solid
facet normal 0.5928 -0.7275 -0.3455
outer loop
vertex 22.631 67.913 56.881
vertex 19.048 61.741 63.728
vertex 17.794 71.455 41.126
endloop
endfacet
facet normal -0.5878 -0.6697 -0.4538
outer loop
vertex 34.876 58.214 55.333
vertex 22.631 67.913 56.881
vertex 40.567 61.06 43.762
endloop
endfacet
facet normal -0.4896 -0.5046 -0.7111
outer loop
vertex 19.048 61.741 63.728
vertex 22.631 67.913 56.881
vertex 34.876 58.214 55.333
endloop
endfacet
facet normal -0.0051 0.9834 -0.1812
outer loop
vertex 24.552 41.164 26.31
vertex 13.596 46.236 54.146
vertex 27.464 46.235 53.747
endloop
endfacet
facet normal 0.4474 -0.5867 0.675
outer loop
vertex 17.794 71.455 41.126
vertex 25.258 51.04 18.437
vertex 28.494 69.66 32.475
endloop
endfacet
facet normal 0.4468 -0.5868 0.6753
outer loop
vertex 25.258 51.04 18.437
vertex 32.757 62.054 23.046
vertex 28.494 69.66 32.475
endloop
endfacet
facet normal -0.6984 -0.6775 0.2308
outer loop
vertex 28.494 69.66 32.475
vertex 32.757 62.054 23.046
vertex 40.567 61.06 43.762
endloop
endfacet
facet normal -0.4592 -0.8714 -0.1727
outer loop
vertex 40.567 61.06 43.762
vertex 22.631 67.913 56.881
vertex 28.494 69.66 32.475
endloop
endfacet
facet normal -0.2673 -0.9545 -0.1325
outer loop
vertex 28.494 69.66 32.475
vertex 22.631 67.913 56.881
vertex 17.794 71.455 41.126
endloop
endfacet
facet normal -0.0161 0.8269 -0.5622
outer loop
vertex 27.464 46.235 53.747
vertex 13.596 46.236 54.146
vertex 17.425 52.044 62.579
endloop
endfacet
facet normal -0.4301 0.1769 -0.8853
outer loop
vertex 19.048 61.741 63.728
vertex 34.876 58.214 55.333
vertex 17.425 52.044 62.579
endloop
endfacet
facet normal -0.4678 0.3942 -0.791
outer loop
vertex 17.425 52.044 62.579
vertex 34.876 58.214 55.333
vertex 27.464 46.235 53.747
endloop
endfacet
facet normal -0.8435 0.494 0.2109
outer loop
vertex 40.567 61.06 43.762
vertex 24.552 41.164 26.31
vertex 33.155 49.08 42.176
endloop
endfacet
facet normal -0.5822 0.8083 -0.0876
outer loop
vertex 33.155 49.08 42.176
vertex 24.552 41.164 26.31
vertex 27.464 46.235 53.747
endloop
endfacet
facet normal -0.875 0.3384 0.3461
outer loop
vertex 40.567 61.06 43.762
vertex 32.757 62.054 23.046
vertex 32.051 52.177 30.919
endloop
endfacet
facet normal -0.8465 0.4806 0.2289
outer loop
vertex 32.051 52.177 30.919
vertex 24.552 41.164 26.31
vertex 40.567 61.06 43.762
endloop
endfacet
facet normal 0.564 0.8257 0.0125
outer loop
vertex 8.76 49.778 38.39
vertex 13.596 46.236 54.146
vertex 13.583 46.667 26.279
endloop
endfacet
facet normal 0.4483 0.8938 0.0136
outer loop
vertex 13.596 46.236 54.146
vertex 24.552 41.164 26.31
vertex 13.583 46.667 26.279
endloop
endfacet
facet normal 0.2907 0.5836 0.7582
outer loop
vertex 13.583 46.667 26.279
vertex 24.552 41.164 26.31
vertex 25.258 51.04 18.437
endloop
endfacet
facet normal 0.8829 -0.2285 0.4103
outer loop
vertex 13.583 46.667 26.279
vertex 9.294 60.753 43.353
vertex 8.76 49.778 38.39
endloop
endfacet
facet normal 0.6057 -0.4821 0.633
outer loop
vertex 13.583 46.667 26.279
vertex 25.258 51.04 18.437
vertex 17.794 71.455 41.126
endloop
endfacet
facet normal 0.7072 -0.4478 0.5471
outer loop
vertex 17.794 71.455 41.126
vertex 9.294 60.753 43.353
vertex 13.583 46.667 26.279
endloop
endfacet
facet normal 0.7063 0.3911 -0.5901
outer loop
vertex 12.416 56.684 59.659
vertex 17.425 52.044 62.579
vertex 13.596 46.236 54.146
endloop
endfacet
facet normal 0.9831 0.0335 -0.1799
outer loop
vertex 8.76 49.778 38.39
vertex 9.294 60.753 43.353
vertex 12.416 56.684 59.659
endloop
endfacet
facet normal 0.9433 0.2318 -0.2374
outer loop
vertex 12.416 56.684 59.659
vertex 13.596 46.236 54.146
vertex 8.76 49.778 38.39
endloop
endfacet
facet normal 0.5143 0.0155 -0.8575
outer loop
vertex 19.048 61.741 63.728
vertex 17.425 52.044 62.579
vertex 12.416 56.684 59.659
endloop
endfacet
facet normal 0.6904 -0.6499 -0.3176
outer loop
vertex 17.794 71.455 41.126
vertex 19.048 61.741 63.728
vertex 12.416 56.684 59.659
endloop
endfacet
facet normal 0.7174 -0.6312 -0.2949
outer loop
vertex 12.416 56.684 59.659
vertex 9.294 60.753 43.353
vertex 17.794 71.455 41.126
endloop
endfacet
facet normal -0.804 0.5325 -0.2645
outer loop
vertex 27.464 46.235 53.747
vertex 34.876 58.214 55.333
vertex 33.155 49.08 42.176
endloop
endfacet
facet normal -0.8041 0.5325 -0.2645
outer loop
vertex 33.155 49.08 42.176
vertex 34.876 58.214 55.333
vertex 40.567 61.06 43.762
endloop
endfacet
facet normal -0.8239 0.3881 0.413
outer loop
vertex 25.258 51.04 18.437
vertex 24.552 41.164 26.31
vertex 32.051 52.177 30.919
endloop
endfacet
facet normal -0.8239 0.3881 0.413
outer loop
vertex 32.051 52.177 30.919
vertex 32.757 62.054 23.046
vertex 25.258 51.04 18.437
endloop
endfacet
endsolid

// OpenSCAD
// Auto-generated auxetic polyhedron
points = [
    [17.794124, 71.455293, 41.125710],
    [19.047628, 61.741216, 63.728135],
    [22.630669, 67.913069, 56.881282],
    [40.566748, 61.059511, 43.761973],
    [34.876189, 58.214168, 55.332800],
    [27.464187, 46.234568, 53.746520],
    [13.596412, 46.236146, 54.146020],
    [24.552296, 41.163828, 26.310034],
    [28.493637, 69.660155, 32.474624],
    [25.258368, 51.040297, 18.436867],
    [32.756988, 62.053502, 23.046276],
    [17.425373, 52.043894, 62.579152],
    [33.154745, 49.079911, 42.175693],
    [32.050916, 52.177032, 30.919442],
    [13.583015, 46.667351, 26.278936],
    [8.759867, 49.778370, 38.390449],
    [9.293530, 60.753097, 43.353114],
    [12.416419, 56.684375, 59.659412],
];

faces = [
    [0, 1, 2],
    [3, 2, 4],
    [4, 2, 1],
    [5, 6, 7],
    [8, 9, 0],
    [8, 10, 9],
    [3, 10, 8],
    [8, 2, 3],
    [0, 2, 8],
    [11, 6, 5],
    [11, 4, 1],
    [5, 4, 11],
    [12, 7, 3],
    [5, 7, 12],
    [13, 10, 3],
    [3, 7, 13],
    [14, 6, 15],
    [14, 7, 6],
    [9, 7, 14],
    [15, 16, 14],
    [0, 9, 14],
    [14, 16, 0],
    [6, 11, 17],
    [17, 16, 15],
    [15, 6, 17],
    [17, 11, 1],
    [17, 1, 0],
    [0, 16, 17],
    [12, 4, 5],
    [3, 4, 12],
    [13, 7, 9],
    [9, 10, 13],
];

polyhedron(points = points, faces = faces);
